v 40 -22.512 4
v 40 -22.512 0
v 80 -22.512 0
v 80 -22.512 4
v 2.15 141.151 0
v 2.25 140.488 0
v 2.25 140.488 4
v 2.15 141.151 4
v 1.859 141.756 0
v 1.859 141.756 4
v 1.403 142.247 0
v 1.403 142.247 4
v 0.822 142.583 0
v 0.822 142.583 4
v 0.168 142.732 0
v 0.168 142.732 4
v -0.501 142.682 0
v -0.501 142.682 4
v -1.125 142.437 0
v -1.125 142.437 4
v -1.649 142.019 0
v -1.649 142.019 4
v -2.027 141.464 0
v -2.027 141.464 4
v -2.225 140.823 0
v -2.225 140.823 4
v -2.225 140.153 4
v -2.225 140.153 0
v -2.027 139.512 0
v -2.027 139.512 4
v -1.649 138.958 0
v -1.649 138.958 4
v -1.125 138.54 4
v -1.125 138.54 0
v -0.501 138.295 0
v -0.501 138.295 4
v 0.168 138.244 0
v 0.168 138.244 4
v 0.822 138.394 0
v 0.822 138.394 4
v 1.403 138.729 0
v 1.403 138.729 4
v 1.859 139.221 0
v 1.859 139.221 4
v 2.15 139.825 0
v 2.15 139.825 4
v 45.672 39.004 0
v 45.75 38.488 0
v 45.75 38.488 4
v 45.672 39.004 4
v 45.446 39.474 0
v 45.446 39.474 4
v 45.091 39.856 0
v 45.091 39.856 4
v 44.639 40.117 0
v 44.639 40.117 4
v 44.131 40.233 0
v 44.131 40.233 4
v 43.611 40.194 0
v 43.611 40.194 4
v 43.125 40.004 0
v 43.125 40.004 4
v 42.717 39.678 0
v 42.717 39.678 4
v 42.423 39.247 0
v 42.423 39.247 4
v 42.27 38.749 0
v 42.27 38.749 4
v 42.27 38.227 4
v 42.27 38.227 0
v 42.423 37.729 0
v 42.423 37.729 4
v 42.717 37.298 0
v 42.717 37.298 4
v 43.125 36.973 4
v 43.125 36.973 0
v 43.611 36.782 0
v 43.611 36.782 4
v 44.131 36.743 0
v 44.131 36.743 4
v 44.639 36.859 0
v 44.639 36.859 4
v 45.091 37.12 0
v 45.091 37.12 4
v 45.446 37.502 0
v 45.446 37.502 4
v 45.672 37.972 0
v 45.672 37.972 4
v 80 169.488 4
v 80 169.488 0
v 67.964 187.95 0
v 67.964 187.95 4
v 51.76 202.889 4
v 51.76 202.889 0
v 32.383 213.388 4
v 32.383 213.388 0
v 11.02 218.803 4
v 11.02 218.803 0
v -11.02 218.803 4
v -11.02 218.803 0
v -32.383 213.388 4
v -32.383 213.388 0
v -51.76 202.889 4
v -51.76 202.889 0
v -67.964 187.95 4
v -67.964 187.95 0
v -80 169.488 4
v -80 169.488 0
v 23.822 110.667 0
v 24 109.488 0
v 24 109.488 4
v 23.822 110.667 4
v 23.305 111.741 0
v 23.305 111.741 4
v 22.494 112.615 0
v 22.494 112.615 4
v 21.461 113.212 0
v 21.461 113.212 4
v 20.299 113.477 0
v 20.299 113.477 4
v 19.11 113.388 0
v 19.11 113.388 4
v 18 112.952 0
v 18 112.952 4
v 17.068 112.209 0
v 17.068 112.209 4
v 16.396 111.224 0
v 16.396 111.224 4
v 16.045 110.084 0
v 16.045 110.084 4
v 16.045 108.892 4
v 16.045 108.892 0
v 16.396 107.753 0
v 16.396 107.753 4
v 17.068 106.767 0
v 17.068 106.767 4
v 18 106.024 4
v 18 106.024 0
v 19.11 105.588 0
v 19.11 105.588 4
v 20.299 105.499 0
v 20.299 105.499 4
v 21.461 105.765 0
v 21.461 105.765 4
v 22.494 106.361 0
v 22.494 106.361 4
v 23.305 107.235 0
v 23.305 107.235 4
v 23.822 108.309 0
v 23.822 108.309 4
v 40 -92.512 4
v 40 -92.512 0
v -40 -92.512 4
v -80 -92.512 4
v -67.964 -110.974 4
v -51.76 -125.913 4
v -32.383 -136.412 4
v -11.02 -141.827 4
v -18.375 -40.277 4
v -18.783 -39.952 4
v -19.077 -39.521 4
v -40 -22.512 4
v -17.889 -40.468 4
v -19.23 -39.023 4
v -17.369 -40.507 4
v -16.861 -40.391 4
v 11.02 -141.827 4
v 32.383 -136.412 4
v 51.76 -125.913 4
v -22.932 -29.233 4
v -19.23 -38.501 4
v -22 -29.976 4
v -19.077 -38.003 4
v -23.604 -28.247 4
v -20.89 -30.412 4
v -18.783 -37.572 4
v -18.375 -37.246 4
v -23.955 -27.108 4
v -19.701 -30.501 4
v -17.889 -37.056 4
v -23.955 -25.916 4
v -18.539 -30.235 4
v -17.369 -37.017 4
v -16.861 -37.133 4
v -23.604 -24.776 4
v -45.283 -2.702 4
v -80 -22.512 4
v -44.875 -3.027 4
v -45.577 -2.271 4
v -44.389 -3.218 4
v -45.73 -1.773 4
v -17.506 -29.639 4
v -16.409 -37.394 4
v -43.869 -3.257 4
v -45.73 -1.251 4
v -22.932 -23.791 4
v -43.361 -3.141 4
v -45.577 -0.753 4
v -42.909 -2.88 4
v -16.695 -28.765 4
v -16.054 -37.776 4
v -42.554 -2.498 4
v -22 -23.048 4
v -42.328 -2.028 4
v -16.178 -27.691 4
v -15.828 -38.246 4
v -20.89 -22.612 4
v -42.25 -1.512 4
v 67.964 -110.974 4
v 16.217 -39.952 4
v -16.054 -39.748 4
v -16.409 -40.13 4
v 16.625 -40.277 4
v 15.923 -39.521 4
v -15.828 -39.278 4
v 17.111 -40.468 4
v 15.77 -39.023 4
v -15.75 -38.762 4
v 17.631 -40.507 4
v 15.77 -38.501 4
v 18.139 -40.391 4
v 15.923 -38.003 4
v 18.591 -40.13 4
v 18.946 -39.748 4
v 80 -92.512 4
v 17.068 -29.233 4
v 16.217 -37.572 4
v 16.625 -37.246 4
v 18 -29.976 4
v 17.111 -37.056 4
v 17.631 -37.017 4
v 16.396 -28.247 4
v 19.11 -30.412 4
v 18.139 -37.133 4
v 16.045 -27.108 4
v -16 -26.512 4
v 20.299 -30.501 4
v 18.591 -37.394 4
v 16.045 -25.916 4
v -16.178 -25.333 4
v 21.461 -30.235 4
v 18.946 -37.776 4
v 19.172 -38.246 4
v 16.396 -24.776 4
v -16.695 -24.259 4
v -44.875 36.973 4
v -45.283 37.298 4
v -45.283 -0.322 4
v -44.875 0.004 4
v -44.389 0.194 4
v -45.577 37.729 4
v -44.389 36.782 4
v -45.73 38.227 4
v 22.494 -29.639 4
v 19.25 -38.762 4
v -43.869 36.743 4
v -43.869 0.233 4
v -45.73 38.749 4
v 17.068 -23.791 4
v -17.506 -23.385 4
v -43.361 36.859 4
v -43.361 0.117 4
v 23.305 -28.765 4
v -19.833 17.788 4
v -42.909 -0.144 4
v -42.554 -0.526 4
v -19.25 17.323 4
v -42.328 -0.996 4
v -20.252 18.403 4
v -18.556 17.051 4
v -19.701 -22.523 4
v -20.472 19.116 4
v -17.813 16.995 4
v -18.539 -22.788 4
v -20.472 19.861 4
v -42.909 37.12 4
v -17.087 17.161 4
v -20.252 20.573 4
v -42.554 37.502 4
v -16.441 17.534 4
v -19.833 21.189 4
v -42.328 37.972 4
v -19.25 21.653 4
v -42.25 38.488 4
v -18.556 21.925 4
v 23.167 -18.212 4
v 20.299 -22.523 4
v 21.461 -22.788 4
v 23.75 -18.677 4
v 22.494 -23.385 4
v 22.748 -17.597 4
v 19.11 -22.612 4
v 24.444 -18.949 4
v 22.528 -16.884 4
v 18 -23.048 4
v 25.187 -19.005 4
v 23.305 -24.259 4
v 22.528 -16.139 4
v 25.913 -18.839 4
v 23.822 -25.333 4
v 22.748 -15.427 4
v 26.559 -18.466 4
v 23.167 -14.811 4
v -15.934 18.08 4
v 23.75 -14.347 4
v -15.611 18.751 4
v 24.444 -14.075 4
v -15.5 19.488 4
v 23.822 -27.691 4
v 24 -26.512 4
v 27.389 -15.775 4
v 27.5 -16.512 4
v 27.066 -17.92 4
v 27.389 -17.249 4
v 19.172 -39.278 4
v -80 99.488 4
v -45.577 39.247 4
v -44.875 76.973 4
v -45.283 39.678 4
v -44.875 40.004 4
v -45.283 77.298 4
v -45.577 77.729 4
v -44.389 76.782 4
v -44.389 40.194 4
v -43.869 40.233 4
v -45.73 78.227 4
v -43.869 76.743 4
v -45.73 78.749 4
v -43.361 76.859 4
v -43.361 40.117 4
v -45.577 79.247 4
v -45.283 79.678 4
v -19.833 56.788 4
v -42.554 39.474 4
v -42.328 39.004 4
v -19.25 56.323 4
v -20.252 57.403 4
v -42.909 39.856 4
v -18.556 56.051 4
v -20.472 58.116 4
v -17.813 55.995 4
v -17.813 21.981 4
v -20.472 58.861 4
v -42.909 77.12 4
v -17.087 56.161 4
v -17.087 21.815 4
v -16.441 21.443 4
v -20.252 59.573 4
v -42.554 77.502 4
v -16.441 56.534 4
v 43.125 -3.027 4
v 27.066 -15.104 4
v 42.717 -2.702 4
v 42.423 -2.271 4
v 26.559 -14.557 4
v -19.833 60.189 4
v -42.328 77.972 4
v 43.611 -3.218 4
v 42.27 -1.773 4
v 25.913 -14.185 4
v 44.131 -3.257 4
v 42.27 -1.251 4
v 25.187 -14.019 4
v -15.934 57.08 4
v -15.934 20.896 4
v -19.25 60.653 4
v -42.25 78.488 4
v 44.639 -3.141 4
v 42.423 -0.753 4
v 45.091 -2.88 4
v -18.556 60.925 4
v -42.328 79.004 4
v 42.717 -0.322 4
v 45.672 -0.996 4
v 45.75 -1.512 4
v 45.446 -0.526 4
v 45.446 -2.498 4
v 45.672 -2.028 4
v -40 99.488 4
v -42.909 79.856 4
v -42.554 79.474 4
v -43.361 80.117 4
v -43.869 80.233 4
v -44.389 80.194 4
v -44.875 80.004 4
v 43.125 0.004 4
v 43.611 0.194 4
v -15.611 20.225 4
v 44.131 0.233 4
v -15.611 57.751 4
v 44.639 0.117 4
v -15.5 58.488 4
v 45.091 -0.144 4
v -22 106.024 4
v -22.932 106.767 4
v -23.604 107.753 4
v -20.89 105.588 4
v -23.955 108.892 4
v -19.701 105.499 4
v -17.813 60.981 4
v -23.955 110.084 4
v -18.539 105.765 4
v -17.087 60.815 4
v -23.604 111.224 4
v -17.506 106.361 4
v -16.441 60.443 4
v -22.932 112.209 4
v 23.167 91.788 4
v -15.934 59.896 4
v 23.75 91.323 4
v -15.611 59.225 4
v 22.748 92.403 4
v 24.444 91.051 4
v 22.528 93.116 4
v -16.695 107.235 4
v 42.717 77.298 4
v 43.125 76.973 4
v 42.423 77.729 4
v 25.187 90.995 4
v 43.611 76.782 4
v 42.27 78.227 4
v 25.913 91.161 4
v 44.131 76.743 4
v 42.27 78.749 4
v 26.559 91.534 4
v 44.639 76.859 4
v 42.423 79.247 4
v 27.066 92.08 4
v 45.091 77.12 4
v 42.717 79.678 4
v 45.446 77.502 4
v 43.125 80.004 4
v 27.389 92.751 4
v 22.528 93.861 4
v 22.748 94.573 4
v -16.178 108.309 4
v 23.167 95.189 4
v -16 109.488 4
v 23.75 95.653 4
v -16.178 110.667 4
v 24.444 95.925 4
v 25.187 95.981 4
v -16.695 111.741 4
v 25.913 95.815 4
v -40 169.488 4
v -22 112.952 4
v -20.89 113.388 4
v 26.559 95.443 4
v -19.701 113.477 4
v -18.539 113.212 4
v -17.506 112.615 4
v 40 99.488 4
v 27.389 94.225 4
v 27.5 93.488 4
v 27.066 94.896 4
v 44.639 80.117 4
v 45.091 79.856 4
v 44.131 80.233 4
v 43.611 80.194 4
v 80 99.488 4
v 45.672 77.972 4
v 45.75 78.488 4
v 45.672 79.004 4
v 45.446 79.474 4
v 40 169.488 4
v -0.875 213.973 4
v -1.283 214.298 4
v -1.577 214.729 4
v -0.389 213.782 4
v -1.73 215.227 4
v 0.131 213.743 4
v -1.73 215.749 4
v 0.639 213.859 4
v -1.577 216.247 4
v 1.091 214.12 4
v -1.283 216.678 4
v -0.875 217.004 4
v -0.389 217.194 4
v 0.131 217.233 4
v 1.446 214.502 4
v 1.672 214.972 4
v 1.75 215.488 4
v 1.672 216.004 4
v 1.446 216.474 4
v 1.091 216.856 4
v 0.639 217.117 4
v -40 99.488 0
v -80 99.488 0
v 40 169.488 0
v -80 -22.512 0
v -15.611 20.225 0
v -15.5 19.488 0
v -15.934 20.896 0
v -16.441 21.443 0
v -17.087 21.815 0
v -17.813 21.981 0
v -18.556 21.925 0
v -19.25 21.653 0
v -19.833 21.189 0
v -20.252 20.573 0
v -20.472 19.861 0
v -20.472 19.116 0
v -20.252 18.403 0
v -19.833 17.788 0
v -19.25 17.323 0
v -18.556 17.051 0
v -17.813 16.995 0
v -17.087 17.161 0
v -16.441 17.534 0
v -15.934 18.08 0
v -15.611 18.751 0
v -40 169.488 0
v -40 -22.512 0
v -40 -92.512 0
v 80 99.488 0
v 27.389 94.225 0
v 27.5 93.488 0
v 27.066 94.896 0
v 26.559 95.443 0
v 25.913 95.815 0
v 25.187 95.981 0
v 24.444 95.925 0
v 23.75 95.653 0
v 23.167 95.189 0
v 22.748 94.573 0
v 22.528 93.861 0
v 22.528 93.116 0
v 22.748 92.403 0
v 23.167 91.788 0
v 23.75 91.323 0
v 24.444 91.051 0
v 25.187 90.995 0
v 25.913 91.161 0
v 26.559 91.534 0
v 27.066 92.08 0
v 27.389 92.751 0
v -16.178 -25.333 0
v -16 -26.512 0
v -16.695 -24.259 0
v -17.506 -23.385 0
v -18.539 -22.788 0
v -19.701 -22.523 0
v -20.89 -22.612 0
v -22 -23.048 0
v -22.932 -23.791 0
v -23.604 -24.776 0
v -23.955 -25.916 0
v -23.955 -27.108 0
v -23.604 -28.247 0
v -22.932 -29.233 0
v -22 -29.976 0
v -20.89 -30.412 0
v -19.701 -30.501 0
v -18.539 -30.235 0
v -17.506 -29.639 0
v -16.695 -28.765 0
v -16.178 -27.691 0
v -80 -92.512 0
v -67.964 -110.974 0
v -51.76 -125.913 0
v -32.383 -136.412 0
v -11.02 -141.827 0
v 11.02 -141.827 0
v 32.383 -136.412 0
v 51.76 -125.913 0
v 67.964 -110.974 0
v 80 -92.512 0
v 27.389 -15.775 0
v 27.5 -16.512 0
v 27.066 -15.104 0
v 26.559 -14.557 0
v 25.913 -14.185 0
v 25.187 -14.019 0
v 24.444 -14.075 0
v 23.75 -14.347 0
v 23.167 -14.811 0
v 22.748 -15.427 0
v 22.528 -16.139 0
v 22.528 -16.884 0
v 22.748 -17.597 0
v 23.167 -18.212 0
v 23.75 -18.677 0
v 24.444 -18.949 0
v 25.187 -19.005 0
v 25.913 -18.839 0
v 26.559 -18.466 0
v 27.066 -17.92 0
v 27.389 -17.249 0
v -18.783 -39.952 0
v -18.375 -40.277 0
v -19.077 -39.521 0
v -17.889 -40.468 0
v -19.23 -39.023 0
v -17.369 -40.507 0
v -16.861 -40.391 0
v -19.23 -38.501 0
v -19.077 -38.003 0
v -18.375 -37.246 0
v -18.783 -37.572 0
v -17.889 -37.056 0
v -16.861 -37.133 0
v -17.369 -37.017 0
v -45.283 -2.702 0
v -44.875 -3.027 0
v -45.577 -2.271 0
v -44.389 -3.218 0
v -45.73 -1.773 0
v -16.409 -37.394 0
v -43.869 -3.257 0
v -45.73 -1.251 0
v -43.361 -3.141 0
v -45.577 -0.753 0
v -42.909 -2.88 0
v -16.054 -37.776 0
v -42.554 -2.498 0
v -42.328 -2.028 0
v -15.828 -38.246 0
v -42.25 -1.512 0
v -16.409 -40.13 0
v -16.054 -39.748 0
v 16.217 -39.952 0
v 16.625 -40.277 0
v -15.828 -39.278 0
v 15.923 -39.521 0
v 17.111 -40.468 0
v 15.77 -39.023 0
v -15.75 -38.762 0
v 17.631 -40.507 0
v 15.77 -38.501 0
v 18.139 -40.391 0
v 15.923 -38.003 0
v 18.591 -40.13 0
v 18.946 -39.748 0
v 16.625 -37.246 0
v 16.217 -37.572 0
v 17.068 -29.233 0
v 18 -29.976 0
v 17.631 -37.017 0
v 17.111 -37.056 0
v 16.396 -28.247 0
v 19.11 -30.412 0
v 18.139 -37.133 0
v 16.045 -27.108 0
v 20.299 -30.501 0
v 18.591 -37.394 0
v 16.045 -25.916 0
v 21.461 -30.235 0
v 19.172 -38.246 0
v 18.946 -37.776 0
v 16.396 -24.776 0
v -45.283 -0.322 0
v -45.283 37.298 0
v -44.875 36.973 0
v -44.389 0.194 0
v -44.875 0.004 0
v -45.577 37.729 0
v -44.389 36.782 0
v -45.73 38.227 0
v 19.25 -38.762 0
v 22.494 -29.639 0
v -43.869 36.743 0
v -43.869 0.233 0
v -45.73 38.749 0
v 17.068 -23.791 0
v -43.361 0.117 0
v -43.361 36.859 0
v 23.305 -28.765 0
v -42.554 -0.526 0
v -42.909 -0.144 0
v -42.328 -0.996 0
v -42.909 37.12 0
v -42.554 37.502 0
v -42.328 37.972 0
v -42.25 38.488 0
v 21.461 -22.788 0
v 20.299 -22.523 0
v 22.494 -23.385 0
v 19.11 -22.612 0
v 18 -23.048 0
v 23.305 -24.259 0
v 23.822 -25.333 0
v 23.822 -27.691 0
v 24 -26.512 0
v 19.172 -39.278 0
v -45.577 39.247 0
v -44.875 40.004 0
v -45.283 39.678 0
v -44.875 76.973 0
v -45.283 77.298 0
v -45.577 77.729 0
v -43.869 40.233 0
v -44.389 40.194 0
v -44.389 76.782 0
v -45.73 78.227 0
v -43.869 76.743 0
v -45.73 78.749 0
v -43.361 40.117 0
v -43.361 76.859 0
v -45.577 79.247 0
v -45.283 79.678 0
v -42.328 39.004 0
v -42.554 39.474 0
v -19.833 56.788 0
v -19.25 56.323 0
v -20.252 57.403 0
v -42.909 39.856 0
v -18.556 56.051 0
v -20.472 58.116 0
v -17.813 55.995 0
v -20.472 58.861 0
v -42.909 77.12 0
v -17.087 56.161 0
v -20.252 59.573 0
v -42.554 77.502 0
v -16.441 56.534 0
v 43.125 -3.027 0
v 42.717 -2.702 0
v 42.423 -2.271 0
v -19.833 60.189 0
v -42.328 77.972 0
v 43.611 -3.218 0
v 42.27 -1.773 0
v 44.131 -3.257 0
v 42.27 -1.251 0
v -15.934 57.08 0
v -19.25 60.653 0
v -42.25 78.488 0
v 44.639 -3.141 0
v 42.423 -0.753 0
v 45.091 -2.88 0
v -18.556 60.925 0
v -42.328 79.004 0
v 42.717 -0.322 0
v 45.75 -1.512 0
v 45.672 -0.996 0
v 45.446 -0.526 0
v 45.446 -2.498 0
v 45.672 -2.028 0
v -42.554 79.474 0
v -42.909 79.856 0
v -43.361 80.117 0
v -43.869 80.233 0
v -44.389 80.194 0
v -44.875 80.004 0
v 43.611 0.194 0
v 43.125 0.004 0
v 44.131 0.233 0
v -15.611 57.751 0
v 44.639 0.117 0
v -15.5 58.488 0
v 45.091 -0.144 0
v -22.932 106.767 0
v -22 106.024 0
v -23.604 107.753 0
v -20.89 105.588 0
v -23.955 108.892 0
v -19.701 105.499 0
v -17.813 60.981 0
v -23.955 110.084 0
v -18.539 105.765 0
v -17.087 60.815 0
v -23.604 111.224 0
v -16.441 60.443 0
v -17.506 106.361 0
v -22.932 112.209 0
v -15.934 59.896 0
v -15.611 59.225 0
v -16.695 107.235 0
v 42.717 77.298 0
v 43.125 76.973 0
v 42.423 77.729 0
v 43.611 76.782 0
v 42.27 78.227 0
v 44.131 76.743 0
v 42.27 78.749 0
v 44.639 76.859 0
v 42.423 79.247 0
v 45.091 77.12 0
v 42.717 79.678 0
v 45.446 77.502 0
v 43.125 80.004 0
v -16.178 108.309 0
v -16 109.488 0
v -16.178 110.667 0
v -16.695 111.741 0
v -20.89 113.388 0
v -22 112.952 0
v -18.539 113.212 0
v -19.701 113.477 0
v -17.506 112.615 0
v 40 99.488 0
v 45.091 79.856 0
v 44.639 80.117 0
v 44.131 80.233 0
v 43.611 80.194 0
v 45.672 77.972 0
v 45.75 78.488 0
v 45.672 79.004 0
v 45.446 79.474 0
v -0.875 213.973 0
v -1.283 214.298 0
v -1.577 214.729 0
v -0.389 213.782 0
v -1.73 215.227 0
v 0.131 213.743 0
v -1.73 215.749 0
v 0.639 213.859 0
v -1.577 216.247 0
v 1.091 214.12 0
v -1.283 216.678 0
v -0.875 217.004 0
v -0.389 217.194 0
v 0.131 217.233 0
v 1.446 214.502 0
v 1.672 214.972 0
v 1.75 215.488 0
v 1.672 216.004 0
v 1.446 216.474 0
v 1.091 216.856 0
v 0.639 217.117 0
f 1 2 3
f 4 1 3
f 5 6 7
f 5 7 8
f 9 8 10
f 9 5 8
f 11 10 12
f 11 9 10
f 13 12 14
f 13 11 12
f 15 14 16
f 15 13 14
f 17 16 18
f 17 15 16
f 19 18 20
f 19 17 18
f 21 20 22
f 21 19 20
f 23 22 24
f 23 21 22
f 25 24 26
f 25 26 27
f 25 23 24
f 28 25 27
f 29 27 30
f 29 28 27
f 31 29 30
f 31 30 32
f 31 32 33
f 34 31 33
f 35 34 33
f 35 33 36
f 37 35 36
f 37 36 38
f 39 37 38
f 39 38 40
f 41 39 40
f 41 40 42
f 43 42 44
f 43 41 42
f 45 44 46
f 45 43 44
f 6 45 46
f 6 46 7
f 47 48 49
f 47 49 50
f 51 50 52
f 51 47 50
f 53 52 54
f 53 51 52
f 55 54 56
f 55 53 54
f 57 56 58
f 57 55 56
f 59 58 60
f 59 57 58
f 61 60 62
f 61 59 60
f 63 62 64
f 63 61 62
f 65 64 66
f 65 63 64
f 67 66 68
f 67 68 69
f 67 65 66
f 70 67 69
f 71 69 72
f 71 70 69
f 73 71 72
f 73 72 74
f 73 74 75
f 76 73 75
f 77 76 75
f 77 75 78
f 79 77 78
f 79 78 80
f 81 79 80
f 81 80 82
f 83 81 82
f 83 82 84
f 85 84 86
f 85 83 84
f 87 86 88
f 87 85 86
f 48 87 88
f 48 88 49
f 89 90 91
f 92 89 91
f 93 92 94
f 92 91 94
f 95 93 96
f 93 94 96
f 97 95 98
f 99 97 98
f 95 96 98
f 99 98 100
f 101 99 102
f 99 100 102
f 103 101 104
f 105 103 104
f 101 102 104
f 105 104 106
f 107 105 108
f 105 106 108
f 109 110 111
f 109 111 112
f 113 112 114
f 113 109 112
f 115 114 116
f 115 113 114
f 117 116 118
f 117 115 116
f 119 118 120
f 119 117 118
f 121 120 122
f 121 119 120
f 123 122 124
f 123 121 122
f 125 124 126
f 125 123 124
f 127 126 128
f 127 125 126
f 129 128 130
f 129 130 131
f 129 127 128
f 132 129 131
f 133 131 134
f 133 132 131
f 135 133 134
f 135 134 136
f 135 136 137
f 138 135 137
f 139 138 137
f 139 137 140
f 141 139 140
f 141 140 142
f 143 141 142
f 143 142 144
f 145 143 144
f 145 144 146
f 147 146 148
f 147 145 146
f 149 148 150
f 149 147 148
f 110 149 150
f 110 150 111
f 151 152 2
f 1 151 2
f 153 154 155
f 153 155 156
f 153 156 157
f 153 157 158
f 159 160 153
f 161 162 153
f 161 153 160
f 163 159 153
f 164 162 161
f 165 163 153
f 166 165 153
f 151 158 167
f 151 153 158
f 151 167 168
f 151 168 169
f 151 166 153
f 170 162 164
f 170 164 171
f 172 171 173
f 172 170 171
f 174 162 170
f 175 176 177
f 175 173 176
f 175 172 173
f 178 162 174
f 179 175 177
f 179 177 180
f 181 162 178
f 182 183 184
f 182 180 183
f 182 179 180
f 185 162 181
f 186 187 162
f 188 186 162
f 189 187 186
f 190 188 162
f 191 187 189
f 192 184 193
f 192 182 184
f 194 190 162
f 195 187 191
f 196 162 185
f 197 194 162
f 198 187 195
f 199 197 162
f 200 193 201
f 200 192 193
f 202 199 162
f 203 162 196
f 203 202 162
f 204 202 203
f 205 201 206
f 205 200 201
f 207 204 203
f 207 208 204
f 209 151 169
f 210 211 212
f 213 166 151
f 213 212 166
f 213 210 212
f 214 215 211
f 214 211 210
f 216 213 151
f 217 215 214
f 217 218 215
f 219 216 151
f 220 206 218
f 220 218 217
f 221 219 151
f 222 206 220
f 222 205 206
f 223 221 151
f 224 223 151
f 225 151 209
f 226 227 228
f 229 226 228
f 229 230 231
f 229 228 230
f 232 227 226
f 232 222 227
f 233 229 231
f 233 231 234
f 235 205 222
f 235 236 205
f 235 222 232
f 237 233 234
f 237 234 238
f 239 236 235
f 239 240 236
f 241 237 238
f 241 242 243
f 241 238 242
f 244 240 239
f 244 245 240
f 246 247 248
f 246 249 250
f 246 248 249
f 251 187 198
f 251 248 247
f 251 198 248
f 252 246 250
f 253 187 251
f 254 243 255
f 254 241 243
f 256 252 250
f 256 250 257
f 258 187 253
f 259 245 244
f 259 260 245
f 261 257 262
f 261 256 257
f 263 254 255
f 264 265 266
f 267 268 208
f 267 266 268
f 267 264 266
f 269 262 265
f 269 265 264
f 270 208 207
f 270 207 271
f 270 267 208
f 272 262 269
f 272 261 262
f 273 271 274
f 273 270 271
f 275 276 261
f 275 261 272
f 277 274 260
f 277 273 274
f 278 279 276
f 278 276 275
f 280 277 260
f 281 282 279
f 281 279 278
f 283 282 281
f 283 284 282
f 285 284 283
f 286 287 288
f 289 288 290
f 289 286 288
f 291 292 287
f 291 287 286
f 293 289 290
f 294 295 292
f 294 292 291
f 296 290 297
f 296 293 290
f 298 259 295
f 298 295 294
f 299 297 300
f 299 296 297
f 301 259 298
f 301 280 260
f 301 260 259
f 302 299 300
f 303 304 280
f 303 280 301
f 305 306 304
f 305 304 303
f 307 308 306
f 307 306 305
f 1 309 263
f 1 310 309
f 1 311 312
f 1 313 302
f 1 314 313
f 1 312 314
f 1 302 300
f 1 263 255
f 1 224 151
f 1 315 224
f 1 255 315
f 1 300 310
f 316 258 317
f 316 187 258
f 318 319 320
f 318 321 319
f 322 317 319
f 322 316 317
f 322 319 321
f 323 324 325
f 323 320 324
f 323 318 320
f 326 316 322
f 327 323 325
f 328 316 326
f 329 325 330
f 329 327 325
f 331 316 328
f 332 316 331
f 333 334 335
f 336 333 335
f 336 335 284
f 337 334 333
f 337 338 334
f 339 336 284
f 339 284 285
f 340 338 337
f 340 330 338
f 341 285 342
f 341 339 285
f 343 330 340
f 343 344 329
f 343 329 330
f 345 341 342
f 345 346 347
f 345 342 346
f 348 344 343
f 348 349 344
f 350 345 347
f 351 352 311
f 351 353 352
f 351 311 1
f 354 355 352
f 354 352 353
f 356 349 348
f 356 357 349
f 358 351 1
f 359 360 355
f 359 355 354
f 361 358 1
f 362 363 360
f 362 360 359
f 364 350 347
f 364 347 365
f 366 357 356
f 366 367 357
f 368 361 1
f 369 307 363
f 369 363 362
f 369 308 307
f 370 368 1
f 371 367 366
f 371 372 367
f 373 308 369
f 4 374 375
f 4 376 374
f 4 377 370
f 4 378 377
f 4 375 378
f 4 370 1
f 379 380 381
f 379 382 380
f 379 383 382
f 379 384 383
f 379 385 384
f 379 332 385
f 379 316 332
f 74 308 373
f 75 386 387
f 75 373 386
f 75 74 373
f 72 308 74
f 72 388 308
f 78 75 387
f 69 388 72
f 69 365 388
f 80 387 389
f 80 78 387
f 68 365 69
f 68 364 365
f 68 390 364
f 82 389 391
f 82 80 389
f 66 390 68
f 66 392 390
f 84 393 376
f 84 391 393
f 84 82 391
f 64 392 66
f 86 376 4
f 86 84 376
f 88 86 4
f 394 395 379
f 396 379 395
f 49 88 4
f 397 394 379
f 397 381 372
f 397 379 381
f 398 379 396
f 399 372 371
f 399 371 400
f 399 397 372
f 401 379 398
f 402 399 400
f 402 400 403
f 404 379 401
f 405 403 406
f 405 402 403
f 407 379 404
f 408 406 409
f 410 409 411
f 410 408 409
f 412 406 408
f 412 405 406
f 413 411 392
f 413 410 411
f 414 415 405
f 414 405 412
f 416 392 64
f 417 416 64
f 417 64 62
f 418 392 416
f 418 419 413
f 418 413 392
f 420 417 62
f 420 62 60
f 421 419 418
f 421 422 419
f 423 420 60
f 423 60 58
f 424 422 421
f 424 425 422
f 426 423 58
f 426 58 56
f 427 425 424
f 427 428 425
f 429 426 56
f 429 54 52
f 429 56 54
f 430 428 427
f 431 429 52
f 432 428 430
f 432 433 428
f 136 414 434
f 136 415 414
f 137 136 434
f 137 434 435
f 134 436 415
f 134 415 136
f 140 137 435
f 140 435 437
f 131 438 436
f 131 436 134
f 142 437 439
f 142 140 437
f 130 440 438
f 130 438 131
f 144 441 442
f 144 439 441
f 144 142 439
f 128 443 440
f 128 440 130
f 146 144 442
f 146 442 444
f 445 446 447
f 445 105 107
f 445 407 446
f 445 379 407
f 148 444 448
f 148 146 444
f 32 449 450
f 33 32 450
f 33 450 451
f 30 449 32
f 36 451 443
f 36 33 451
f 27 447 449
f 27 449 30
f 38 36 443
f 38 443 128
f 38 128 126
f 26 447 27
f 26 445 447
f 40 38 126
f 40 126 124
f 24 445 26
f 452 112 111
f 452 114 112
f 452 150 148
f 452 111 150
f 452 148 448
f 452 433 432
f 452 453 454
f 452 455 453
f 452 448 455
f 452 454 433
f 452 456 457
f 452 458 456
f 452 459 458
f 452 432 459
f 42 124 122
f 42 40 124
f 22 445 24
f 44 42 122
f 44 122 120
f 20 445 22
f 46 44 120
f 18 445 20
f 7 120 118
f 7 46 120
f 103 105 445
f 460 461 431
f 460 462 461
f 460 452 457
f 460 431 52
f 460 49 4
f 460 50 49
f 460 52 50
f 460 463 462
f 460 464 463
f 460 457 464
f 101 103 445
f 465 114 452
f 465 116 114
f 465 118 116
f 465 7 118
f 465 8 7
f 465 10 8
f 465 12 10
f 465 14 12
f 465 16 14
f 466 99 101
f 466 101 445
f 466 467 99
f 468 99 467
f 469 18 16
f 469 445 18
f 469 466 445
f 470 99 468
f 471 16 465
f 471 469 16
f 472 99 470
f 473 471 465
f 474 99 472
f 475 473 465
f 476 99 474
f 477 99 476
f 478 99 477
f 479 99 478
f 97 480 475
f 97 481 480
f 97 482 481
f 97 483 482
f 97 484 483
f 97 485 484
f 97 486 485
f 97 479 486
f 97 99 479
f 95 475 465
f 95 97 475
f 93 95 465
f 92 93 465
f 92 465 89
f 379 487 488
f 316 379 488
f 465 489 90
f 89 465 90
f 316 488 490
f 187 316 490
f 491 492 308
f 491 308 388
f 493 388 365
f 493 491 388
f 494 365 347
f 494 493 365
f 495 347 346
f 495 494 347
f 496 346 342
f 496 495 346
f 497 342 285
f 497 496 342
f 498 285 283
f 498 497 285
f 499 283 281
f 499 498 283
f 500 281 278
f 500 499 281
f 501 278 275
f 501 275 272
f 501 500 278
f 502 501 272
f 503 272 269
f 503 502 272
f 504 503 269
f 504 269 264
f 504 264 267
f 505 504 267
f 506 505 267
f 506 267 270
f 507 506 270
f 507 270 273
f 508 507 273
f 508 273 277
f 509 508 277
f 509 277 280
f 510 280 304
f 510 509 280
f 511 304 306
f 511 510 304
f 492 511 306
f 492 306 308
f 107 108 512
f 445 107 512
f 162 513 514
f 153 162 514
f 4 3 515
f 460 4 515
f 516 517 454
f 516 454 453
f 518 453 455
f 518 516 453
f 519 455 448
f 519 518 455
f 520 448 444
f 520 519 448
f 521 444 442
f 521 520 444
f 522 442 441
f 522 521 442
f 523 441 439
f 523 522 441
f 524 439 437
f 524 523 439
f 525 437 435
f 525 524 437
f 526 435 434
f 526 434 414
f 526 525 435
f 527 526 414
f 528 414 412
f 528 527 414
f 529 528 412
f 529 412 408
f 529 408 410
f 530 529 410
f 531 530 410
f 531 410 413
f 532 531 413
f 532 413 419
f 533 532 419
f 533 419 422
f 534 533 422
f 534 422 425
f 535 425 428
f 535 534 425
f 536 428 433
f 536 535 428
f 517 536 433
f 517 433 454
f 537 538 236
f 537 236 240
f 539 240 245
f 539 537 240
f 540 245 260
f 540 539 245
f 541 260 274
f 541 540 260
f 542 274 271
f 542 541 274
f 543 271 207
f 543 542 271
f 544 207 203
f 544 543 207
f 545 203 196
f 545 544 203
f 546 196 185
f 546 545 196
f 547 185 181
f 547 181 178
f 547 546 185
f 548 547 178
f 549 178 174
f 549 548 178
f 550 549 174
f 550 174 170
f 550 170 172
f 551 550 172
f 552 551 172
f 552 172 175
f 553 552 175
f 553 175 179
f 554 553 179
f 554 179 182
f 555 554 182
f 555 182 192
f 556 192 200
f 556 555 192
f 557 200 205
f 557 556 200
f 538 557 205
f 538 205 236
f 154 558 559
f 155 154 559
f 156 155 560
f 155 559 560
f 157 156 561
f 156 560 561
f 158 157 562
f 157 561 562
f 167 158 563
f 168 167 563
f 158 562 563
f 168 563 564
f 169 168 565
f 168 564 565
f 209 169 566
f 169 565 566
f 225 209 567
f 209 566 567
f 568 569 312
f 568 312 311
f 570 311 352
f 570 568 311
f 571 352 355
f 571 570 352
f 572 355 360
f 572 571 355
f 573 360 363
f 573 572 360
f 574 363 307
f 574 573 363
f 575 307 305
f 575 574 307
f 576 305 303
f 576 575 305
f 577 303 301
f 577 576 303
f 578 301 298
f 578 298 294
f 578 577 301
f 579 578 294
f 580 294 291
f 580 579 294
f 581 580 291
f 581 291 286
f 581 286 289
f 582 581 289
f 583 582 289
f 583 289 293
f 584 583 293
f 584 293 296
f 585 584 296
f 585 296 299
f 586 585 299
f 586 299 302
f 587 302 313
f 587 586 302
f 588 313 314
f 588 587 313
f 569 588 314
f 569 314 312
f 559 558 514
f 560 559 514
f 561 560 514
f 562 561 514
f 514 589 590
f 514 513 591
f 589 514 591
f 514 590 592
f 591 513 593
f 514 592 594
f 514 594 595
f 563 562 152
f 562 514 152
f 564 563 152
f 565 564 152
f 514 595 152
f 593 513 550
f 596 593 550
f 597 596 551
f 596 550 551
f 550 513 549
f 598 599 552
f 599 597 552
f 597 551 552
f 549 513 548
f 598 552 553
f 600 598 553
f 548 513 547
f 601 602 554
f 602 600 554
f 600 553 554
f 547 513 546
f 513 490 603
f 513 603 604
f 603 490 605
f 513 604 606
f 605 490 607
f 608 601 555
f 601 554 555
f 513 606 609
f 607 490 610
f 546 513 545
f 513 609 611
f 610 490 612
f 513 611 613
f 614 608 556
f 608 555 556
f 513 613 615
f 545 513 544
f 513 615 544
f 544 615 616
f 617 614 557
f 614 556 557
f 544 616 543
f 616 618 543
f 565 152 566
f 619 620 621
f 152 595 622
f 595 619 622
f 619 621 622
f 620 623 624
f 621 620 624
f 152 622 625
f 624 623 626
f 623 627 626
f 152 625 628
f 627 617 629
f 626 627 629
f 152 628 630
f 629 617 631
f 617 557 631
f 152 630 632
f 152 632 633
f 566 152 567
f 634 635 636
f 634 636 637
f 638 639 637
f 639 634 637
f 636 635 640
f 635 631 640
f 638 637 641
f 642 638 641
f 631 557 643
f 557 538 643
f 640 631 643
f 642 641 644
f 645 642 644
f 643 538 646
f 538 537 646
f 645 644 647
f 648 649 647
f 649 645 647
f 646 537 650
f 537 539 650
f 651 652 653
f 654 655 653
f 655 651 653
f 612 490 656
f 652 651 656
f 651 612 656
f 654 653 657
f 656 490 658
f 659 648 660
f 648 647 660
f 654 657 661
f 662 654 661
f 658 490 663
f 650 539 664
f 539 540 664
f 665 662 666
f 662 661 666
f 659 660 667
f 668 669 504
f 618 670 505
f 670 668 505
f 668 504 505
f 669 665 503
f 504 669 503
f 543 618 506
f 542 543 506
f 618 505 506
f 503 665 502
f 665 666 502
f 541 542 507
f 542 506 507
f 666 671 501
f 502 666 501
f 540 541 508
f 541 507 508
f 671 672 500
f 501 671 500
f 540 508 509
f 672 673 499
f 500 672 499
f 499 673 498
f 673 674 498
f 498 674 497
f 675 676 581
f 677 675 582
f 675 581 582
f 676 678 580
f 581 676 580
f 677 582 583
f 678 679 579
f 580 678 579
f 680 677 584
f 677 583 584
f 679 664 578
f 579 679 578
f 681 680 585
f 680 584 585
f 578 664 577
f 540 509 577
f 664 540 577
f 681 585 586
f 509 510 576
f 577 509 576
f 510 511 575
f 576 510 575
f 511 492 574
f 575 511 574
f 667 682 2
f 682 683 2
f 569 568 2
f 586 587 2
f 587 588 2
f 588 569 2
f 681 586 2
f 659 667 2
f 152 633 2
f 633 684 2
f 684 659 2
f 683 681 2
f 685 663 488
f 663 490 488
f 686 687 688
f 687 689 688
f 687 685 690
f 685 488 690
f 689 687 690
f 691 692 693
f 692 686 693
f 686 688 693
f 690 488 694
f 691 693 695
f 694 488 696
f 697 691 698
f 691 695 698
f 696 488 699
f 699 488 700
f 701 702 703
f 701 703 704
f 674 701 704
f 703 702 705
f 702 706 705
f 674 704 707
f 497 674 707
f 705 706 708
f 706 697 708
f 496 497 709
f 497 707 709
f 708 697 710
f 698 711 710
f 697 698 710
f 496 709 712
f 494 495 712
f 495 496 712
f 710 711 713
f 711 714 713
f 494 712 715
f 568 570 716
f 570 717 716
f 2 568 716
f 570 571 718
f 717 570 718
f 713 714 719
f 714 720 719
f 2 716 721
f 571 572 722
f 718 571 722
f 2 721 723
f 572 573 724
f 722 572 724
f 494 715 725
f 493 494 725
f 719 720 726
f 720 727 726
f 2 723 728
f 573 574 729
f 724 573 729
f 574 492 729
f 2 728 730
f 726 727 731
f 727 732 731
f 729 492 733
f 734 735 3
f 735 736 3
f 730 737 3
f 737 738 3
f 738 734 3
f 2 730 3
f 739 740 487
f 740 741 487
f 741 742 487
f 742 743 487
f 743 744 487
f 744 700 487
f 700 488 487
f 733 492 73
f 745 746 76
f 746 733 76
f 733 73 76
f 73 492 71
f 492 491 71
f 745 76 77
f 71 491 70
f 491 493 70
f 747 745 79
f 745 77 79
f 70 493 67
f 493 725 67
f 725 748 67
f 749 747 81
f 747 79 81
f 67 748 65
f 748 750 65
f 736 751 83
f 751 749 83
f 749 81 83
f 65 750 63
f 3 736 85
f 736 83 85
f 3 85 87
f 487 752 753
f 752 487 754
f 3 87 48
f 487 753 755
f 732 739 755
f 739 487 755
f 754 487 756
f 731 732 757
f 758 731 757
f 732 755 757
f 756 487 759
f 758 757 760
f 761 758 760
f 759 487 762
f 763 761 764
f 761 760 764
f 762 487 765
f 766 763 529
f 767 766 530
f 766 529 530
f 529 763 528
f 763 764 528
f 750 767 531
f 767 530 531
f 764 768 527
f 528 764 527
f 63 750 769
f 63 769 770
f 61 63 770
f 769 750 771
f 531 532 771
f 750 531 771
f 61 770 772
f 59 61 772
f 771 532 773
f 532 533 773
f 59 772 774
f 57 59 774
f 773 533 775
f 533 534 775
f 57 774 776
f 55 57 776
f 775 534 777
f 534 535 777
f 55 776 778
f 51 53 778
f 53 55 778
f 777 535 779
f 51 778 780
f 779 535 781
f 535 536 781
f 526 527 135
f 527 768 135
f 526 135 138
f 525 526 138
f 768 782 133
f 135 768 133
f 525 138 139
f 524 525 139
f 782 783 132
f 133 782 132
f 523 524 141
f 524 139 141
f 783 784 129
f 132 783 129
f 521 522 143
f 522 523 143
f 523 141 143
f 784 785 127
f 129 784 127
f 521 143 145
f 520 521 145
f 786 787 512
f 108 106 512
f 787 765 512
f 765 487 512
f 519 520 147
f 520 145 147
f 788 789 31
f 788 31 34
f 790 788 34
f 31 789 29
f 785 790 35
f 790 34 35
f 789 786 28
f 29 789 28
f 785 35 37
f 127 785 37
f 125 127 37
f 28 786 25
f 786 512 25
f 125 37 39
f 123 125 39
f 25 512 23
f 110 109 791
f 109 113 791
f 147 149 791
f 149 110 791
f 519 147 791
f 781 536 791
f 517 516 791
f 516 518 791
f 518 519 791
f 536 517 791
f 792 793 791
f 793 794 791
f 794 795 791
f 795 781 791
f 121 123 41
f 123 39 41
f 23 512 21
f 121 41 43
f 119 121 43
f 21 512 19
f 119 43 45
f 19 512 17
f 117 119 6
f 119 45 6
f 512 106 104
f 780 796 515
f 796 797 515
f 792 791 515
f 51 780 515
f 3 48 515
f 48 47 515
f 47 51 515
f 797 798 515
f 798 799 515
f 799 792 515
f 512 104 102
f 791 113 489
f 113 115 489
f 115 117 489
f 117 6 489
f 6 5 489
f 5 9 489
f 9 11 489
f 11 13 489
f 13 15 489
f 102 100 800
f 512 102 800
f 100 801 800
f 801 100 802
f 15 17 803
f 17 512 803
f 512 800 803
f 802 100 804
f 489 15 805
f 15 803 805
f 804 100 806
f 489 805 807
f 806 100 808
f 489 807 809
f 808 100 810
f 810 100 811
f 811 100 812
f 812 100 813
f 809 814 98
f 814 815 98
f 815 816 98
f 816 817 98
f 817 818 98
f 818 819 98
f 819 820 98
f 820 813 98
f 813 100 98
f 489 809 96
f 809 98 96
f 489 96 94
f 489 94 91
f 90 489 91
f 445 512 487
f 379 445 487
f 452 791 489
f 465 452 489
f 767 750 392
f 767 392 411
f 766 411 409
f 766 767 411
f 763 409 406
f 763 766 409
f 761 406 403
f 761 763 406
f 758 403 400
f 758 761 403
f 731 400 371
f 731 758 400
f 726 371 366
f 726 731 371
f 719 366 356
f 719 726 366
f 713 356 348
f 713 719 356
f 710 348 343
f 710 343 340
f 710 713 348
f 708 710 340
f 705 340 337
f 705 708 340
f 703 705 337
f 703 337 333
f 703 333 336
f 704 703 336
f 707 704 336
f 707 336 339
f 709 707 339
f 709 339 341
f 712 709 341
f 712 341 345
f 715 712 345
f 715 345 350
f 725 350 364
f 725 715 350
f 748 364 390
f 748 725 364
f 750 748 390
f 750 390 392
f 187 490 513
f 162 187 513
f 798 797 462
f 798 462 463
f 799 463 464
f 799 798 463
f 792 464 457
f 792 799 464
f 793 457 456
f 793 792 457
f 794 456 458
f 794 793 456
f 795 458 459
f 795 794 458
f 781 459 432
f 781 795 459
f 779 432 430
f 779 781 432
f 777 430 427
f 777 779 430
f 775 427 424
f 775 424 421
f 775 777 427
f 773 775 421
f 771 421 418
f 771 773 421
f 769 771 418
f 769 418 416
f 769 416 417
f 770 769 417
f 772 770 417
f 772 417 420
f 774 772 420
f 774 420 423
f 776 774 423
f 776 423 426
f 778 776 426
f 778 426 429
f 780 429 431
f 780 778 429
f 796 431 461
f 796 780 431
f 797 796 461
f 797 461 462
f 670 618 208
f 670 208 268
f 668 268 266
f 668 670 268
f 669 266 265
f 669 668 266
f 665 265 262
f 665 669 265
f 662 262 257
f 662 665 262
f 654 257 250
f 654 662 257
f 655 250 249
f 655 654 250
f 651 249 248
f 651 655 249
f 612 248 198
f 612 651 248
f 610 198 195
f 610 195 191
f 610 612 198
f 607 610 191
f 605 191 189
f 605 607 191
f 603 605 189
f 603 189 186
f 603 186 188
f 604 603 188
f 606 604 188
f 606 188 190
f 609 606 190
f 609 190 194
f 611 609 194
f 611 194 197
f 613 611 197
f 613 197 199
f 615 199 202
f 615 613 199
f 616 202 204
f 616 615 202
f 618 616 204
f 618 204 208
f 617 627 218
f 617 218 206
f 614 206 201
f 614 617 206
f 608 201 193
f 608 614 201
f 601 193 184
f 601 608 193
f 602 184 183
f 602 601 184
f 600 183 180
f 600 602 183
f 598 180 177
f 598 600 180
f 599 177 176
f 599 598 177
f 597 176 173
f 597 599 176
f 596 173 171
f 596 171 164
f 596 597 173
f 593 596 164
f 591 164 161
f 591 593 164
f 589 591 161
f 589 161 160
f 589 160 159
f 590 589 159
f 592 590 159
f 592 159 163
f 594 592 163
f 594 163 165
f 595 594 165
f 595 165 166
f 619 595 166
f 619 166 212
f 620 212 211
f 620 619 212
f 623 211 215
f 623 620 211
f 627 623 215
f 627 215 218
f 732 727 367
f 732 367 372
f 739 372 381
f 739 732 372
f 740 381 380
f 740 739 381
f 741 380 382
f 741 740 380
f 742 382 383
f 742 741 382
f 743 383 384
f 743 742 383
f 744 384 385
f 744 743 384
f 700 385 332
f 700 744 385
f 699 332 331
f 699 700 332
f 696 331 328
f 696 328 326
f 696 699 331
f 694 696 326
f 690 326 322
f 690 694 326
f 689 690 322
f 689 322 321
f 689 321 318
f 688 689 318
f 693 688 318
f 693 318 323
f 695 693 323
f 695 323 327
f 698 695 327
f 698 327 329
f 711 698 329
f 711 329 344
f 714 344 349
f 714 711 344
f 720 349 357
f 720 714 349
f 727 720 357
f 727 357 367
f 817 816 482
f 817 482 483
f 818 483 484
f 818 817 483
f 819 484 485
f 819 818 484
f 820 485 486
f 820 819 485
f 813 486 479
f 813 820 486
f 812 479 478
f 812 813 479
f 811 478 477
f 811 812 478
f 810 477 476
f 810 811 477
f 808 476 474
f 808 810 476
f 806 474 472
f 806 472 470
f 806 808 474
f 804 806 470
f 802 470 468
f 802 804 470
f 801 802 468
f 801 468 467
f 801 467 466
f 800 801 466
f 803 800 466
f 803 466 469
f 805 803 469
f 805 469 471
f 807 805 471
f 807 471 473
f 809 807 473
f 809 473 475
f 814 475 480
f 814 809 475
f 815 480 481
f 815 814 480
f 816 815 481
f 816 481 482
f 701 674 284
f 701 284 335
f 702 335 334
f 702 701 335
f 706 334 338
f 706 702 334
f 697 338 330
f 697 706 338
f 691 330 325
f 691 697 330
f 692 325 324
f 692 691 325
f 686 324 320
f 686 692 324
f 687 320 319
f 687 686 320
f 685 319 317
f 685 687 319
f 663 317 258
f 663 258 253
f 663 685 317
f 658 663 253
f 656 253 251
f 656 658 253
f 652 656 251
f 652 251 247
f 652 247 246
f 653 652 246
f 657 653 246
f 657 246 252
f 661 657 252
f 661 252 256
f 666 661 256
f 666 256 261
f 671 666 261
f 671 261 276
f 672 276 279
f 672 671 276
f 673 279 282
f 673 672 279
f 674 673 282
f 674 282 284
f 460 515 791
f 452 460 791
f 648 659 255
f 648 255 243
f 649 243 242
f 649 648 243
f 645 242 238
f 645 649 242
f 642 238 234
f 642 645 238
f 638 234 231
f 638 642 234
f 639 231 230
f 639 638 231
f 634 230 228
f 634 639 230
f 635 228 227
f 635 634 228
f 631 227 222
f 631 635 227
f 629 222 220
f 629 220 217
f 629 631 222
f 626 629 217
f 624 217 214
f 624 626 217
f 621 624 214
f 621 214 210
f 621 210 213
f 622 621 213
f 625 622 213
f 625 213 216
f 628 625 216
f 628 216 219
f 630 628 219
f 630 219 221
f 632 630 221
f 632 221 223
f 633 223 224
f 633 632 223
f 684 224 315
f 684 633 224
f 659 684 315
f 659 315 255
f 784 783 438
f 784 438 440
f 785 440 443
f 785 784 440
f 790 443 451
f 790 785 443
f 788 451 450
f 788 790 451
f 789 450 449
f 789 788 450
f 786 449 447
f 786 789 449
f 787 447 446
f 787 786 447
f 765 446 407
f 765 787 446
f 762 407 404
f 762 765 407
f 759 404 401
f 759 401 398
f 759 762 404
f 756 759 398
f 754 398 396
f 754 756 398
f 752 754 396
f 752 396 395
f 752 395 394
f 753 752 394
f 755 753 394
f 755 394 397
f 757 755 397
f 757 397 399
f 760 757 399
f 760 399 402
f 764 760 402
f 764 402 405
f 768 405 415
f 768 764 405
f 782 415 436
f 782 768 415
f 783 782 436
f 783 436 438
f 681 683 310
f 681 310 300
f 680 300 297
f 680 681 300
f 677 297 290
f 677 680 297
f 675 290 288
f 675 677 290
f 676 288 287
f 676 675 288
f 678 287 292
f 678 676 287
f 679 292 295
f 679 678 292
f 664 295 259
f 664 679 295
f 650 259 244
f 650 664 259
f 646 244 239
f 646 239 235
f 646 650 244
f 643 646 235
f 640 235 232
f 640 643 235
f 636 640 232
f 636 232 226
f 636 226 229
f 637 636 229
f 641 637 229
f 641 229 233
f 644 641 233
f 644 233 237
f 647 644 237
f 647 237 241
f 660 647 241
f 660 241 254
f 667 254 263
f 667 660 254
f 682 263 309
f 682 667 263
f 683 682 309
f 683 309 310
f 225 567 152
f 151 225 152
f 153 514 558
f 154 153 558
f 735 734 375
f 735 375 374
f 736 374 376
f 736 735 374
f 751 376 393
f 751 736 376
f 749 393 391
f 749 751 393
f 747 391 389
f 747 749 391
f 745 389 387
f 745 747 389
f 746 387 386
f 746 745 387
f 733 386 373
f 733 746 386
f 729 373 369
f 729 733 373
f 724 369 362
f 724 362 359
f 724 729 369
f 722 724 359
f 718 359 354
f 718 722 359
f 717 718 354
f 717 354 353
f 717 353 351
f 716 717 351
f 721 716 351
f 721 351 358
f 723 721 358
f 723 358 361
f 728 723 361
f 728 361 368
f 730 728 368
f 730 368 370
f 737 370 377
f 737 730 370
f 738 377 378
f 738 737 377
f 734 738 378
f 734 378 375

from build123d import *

# Parameters (mm, degrees)
F0_R     = 1.75
F0_R_2   = 4
F0_R_3   = 2.5
F0_R_4   = 2.25
F1_DEPTH = 4


with BuildPart() as f1:
    # F0 (on Top) → F1 (new body)
    with BuildSketch(Plane.XY):
        with BuildLine():
            ThreePointArc((80, 169.488149), (0, 219.488149), (-80, 169.488149))
            Line((-80, 169.488149), (-40, 169.488149))
            Line((-40, 169.488149), (-40, 99.488149))
            Line((-40, 99.488149), (-80, 99.488149))
            Line((-80, 99.488149), (-80, -22.511851))
            Line((-80, -22.511851), (-40, -22.511851))
            Line((-40, -22.511851), (-40, -92.511851))
            Line((-40, -92.511851), (-80, -92.511851))
            ThreePointArc((-80, -92.511851), (0, -142.511851), (80, -92.511851))
            Line((80, -92.511851), (40, -92.511851))
            Line((40, -92.511851), (40, -22.511851))
            Line((40, -22.511851), (80, -22.511851))
            Line((80, -22.511851), (80, 99.488149))
            Line((80, 99.488149), (40, 99.488149))
            Line((40, 99.488149), (40, 169.488149))
            Line((40, 169.488149), (80, 169.488149))
        make_face()
        with Locations((-44, -1.511851)):
            Circle(F0_R, mode=Mode.SUBTRACT)
        with Locations((-17.5, -38.761851)):
            Circle(F0_R, mode=Mode.SUBTRACT)
        with Locations((-20, -26.511851)):
            Circle(F0_R_2, mode=Mode.SUBTRACT)
        with Locations((-18, 19.488149)):
            Circle(F0_R_3, mode=Mode.SUBTRACT)
        with Locations((17.5, -38.761851)):
            Circle(F0_R, mode=Mode.SUBTRACT)
        with Locations((20, -26.511851)):
            Circle(F0_R_2, mode=Mode.SUBTRACT)
        with Locations((25, -16.511851)):
            Circle(F0_R_3, mode=Mode.SUBTRACT)
        with Locations((44, -1.511851)):
            Circle(F0_R, mode=Mode.SUBTRACT)
        with Locations((-44, 38.488149)):
            Circle(F0_R, mode=Mode.SUBTRACT)
        with Locations((-44, 78.488149)):
            Circle(F0_R, mode=Mode.SUBTRACT)
        with Locations((-18, 58.488149)):
            Circle(F0_R_3, mode=Mode.SUBTRACT)
        with Locations((-20, 109.488149)):
            Circle(F0_R_2, mode=Mode.SUBTRACT)
        with Locations((25, 93.488149)):
            Circle(F0_R_3, mode=Mode.SUBTRACT)
        with Locations((20, 109.488149)):
            Circle(F0_R_2, mode=Mode.SUBTRACT)
        with Locations((44, 38.488149)):
            Circle(F0_R, mode=Mode.SUBTRACT)
        with Locations((44, 78.488149)):
            Circle(F0_R, mode=Mode.SUBTRACT)
        with Locations((0, 140.488149)):
            Circle(F0_R_4, mode=Mode.SUBTRACT)
        with Locations((0, 215.488149)):
            Circle(F0_R, mode=Mode.SUBTRACT)
    extrude(amount=F1_DEPTH)


solid = f1.part
